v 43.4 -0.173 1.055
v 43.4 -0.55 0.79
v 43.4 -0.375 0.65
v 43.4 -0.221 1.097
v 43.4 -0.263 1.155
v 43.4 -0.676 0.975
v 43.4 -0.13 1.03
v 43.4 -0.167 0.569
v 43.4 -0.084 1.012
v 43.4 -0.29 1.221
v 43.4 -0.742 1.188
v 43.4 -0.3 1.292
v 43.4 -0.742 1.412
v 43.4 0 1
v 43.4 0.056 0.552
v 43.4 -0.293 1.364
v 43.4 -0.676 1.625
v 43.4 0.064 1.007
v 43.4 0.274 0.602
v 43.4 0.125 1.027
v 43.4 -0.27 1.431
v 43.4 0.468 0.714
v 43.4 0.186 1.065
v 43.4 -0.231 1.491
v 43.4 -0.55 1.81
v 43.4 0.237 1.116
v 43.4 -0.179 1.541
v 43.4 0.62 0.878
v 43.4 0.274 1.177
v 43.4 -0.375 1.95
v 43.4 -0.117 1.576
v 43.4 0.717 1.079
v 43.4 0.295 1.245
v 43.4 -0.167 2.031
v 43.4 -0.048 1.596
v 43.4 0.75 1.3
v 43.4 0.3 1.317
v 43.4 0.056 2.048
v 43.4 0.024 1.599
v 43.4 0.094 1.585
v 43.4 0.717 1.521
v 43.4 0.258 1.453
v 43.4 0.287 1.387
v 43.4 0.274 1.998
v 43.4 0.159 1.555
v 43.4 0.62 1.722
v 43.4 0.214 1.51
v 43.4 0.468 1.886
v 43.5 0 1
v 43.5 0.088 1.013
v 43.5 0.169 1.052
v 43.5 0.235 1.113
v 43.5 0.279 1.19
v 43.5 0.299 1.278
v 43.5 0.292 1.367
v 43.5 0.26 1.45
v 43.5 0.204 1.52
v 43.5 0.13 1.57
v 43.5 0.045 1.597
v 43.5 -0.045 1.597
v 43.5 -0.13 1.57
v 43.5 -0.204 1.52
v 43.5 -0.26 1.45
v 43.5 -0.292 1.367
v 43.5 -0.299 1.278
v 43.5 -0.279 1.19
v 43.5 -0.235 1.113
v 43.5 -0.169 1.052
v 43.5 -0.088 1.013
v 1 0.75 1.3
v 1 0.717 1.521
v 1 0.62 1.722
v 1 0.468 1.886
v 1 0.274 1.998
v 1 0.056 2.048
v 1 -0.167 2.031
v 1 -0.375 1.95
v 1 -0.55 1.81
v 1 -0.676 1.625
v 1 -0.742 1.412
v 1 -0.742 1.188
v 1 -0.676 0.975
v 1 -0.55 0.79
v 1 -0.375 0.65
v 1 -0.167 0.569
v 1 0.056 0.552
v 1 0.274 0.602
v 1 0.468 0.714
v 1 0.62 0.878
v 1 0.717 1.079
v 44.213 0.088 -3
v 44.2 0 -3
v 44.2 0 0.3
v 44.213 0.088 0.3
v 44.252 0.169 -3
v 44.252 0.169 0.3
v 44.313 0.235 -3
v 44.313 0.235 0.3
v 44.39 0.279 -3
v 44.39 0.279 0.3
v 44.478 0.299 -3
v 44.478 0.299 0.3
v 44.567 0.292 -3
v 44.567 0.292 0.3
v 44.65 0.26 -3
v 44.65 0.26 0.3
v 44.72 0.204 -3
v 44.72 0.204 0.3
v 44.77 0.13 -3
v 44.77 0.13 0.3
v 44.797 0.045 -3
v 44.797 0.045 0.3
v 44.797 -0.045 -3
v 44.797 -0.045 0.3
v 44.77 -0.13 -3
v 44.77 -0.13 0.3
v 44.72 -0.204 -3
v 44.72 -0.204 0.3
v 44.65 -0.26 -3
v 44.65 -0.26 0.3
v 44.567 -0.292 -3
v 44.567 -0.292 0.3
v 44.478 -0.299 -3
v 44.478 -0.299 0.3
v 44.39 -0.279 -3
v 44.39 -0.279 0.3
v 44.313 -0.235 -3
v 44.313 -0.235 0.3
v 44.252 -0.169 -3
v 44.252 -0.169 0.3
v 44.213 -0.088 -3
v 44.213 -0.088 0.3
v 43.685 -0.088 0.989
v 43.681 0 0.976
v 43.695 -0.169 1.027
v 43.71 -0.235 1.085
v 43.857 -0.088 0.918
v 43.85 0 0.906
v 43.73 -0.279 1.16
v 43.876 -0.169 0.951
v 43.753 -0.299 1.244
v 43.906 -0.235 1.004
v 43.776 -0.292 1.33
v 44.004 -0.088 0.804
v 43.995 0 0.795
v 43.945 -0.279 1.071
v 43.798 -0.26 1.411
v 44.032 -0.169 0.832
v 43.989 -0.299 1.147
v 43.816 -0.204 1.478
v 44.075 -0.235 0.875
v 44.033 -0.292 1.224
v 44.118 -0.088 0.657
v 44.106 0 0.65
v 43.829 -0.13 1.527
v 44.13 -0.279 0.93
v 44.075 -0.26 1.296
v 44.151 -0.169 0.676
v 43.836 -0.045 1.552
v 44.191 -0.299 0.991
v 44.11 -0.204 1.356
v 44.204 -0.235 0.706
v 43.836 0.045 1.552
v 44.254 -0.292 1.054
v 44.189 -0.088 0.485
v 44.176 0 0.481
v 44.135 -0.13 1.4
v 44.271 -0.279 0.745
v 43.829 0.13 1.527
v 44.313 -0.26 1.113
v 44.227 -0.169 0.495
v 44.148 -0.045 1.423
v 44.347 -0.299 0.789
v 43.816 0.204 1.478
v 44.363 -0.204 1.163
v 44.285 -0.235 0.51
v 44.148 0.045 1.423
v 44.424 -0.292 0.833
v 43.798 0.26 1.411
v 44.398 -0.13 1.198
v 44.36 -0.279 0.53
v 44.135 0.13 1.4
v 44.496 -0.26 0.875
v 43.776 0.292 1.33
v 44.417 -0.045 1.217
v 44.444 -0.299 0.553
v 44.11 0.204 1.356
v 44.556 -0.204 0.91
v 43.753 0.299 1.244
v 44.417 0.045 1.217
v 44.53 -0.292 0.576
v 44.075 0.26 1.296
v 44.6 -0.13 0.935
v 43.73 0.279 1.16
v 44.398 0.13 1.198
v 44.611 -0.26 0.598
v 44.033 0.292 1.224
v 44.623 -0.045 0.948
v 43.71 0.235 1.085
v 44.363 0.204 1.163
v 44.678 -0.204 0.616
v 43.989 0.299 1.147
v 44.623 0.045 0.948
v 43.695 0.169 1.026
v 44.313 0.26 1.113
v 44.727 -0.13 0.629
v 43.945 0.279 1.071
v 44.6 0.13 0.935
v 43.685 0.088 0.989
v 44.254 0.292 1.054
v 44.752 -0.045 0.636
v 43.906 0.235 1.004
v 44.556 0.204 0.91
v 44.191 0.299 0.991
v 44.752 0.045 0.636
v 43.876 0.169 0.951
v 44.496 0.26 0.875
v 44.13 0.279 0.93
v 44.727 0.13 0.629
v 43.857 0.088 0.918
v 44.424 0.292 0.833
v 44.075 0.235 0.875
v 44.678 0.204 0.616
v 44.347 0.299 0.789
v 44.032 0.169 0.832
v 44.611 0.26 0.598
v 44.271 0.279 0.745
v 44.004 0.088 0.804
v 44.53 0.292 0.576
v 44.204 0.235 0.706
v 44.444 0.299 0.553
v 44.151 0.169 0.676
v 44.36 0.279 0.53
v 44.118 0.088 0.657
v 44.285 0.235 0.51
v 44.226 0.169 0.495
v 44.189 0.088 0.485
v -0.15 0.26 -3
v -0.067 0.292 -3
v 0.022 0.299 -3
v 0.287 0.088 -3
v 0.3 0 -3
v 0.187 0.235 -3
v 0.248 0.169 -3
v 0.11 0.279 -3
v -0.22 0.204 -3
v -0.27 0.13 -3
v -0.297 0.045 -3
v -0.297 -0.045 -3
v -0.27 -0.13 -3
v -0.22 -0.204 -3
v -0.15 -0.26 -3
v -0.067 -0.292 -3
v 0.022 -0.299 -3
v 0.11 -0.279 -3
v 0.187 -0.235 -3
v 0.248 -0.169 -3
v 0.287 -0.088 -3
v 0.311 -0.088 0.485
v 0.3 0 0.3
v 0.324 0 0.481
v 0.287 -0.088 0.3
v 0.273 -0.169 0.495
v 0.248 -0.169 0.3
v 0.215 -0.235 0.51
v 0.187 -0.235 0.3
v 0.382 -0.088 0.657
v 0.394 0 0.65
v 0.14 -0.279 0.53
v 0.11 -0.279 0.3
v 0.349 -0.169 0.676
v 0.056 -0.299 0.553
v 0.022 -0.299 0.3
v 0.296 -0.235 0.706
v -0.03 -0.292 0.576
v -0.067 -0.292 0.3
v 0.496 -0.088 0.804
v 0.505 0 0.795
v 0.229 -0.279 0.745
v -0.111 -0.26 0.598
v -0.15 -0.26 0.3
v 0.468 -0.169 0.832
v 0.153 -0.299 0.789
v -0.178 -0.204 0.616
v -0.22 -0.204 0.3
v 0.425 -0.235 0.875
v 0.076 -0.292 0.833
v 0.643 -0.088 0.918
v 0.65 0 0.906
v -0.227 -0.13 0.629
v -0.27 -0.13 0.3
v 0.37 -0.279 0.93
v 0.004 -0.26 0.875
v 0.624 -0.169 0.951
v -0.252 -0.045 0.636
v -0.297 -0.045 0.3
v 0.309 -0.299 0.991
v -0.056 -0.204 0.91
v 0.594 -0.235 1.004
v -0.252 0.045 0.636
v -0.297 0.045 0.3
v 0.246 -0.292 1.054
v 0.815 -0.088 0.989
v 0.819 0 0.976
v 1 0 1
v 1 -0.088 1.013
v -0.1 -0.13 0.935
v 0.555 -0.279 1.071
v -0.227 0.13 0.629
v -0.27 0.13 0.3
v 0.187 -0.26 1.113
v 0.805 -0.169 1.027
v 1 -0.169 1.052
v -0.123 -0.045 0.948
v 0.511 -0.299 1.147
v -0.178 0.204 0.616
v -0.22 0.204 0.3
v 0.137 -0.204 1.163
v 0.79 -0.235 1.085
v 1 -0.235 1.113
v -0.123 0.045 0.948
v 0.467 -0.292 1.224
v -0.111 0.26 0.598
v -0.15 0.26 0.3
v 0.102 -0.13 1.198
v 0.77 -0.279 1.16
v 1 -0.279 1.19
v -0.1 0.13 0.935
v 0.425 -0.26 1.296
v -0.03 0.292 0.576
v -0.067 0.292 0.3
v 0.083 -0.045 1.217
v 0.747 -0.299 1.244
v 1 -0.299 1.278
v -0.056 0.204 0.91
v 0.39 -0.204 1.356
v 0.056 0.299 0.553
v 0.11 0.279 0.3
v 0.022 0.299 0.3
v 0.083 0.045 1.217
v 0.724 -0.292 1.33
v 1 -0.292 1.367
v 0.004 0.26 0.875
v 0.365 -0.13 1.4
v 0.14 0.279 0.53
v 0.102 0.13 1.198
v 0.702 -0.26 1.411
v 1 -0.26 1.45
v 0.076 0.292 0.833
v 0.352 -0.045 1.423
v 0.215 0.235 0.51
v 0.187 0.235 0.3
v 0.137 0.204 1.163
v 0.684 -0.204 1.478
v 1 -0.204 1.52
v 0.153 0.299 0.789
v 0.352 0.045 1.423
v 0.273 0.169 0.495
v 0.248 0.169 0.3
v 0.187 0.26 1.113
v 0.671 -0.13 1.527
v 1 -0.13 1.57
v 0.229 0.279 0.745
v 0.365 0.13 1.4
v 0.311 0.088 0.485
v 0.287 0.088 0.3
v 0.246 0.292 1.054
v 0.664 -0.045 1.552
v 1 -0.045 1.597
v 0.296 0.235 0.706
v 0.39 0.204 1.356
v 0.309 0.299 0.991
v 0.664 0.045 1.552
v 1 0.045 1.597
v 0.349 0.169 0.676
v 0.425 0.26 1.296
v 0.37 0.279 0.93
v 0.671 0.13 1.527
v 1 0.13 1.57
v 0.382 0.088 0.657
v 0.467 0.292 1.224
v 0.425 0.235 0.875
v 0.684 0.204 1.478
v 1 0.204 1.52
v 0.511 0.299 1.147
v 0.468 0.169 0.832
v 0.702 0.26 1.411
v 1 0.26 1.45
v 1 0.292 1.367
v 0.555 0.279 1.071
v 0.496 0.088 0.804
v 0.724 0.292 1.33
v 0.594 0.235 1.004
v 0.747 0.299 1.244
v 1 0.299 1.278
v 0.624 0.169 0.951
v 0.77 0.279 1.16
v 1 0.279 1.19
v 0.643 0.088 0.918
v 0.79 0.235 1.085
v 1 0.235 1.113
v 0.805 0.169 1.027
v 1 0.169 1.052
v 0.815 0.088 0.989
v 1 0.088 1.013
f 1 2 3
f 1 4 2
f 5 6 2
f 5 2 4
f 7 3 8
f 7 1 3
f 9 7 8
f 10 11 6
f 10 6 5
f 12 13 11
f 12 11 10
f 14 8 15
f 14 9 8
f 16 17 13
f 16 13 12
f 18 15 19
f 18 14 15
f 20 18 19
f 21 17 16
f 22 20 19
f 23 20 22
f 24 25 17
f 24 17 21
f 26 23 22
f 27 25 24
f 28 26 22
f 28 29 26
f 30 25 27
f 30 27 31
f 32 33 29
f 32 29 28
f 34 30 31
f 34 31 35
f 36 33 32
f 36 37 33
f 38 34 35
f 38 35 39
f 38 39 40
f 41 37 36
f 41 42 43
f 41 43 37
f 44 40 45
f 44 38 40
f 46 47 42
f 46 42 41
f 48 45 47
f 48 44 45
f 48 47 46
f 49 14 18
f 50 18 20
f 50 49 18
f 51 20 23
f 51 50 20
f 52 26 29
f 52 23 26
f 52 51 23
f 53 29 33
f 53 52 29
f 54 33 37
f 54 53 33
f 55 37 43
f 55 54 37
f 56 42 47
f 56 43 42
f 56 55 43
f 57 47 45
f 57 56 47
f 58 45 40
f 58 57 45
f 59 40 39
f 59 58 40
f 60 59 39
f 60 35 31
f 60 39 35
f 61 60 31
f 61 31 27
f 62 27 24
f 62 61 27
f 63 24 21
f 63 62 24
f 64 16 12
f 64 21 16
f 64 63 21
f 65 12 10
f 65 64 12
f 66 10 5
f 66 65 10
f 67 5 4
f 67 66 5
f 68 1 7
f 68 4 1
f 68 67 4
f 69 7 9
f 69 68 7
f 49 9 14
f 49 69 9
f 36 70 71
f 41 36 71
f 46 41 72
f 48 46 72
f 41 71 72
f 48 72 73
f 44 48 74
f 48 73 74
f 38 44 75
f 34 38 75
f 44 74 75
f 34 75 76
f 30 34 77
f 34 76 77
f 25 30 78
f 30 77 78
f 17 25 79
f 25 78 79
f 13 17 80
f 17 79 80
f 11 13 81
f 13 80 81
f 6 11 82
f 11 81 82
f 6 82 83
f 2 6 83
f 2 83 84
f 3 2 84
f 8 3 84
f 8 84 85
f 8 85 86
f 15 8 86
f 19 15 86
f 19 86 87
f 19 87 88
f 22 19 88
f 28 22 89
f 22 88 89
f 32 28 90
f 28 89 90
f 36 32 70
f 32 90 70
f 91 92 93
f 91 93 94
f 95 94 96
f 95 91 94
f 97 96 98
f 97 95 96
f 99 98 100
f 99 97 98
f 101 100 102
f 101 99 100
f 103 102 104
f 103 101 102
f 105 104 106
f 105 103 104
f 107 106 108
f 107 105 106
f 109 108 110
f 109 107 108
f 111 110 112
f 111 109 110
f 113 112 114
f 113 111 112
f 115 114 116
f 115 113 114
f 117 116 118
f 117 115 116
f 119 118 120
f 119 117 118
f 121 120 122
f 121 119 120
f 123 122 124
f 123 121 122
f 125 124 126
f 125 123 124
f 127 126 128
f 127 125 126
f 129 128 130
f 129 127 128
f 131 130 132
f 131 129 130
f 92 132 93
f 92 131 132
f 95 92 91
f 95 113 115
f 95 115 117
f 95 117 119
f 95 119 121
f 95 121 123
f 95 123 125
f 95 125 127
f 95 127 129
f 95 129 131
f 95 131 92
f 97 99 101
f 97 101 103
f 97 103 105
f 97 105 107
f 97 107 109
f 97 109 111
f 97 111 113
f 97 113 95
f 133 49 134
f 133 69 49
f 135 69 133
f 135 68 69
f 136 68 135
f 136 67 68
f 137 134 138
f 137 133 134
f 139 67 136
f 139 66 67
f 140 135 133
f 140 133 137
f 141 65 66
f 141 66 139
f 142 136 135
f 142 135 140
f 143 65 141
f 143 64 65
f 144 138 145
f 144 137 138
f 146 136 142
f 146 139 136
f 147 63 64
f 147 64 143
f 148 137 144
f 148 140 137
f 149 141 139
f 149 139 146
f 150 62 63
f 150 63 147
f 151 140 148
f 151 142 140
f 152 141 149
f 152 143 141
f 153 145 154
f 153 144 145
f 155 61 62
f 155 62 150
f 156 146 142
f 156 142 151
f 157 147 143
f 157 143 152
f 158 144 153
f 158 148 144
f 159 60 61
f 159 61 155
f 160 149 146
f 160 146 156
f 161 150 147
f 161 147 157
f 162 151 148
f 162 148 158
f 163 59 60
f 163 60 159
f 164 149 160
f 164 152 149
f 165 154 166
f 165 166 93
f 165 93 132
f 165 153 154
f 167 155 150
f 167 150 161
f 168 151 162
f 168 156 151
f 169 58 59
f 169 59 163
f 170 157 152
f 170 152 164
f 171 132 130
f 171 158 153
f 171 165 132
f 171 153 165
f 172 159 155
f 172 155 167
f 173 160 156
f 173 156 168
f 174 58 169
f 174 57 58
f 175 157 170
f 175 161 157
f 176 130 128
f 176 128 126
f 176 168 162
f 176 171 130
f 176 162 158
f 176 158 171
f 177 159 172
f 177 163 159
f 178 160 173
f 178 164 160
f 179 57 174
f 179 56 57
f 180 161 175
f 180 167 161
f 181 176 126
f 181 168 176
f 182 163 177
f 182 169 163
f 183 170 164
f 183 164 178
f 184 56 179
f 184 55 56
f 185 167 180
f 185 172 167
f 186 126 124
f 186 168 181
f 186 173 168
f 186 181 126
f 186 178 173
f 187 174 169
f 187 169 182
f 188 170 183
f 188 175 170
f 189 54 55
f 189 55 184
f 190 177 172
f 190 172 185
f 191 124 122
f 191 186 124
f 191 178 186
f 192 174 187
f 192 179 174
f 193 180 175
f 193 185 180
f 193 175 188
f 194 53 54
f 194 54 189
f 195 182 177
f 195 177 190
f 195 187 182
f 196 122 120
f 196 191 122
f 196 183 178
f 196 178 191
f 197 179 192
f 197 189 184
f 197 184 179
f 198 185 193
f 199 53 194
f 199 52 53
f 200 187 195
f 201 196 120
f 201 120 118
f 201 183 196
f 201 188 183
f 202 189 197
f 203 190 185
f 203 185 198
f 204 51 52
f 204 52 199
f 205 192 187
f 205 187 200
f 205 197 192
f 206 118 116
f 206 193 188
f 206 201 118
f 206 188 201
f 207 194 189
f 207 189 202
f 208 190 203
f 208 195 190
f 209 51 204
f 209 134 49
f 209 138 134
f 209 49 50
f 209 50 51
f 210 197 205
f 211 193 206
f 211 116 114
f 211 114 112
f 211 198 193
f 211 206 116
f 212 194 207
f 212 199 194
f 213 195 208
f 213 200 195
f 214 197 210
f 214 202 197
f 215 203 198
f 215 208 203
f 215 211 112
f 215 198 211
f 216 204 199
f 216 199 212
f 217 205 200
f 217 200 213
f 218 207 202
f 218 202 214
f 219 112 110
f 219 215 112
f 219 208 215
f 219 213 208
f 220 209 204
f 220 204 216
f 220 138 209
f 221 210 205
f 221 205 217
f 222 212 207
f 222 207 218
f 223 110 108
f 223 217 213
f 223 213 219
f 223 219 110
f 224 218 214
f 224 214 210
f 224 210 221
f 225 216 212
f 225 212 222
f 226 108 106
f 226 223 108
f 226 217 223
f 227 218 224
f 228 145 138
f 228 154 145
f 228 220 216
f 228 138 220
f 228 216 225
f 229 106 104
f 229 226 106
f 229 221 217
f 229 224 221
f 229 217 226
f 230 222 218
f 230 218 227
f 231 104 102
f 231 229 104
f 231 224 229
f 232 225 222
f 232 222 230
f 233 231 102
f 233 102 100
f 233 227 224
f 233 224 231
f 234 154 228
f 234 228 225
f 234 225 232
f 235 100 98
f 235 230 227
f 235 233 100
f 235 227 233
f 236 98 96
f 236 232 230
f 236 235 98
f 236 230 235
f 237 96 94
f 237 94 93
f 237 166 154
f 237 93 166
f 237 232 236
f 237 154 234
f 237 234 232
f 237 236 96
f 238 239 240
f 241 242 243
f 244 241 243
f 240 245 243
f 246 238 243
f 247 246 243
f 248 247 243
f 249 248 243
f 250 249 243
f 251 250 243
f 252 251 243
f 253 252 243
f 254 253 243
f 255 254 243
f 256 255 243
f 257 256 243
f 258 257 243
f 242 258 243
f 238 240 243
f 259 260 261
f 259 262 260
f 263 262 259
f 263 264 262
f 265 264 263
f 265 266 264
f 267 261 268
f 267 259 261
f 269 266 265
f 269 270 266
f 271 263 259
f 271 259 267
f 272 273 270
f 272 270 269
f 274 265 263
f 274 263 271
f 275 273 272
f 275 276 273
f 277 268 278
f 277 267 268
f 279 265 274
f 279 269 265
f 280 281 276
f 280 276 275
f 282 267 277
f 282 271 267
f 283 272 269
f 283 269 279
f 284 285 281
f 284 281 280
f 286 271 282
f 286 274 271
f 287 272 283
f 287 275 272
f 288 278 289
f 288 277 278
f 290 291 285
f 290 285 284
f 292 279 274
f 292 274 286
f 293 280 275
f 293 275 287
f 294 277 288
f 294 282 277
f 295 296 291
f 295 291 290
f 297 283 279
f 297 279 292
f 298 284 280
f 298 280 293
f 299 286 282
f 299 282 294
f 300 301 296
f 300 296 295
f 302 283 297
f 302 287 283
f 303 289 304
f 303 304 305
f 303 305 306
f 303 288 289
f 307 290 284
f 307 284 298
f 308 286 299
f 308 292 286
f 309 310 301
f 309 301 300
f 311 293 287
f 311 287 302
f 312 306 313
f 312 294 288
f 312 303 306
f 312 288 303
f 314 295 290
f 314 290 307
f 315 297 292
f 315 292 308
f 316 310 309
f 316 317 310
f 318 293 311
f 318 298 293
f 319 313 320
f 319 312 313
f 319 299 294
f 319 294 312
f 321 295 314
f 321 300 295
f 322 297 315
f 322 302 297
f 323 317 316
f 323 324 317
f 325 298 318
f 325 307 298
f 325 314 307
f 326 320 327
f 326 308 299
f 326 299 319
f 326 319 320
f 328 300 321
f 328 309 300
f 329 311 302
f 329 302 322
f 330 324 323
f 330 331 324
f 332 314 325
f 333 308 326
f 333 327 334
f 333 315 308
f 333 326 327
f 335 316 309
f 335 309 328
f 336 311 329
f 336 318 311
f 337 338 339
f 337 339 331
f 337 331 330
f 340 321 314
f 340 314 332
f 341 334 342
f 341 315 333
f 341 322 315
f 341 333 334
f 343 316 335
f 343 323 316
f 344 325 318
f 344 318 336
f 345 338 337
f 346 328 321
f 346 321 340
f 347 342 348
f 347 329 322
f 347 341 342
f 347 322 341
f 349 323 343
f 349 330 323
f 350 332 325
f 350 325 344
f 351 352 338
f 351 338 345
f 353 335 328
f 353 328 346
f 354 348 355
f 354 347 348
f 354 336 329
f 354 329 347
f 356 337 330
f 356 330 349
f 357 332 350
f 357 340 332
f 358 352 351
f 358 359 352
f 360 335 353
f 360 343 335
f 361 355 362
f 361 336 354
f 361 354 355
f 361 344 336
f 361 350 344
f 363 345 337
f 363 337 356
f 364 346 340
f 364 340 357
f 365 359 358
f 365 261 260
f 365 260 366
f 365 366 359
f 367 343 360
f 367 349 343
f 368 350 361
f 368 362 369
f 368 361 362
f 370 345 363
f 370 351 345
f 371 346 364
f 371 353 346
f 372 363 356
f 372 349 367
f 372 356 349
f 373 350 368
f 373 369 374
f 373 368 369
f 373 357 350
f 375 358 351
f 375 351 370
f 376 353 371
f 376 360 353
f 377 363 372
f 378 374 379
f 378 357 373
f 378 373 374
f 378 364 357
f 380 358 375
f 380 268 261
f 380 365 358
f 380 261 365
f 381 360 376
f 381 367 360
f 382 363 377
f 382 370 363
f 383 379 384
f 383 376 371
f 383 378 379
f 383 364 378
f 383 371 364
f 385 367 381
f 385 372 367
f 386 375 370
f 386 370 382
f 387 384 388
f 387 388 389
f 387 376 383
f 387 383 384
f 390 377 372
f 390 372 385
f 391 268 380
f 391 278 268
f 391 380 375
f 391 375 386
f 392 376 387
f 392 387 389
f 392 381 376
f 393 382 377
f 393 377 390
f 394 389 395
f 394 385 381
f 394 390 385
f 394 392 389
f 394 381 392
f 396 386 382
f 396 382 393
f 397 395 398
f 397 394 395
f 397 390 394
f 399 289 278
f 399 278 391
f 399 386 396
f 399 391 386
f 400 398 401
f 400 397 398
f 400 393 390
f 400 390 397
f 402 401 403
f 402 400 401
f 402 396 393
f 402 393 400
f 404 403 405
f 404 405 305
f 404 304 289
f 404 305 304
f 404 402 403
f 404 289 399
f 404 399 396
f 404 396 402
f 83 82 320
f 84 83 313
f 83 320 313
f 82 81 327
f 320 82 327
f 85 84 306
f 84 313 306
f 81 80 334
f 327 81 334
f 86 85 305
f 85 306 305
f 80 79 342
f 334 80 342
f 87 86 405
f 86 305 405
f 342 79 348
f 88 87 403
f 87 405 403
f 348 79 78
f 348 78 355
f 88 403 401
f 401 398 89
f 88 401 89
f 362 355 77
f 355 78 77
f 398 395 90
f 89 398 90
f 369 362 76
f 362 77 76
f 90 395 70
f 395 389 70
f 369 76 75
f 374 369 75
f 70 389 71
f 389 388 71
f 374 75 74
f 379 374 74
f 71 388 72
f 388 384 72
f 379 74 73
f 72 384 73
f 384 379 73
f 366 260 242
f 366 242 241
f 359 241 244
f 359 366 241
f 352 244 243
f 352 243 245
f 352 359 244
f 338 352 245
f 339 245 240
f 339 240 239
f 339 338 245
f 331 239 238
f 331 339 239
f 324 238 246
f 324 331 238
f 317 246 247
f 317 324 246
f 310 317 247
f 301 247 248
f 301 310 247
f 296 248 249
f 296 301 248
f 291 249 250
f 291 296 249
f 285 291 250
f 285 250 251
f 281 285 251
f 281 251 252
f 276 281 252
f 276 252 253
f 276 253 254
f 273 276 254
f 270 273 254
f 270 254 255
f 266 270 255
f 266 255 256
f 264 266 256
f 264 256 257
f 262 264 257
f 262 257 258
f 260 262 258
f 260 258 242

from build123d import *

# Parameters (mm, degrees)
SKETCH001_R = 0.3
SKETCH002_R = 0.75
PAD_DEPTH   = 42.4


with BuildPart() as part:
    # AdditivePipe: sweep along a path in Sketch
    with BuildLine(Plane.XZ) as additivepipe_path:
        Line((0, -3), (0, 0.3))
        ThreePointArc((0, 0.3), (0.292893, 1.007107), (1, 1.3))
        Line((1, 1.3), (43.5, 1.3))
        ThreePointArc((43.5, 1.3), (44.207107, 1.007107), (44.5, 0.3))
        Line((44.5, 0.3), (44.5, -3))
    # Sketch001 (on DatumPlane) → AdditivePipe (sweep)
    with BuildSketch(Plane.XY.offset(-3)):
        Circle(SKETCH001_R)
    sweep(path=additivepipe_path.line)

    # Sketch002 (on DatumPlane) → Pad (new body)
    with BuildSketch(Plane.YZ.offset(1)):
        with Locations((0, 1.3)):
            Circle(SKETCH002_R)
    extrude(amount=PAD_DEPTH)


solid = part.part
